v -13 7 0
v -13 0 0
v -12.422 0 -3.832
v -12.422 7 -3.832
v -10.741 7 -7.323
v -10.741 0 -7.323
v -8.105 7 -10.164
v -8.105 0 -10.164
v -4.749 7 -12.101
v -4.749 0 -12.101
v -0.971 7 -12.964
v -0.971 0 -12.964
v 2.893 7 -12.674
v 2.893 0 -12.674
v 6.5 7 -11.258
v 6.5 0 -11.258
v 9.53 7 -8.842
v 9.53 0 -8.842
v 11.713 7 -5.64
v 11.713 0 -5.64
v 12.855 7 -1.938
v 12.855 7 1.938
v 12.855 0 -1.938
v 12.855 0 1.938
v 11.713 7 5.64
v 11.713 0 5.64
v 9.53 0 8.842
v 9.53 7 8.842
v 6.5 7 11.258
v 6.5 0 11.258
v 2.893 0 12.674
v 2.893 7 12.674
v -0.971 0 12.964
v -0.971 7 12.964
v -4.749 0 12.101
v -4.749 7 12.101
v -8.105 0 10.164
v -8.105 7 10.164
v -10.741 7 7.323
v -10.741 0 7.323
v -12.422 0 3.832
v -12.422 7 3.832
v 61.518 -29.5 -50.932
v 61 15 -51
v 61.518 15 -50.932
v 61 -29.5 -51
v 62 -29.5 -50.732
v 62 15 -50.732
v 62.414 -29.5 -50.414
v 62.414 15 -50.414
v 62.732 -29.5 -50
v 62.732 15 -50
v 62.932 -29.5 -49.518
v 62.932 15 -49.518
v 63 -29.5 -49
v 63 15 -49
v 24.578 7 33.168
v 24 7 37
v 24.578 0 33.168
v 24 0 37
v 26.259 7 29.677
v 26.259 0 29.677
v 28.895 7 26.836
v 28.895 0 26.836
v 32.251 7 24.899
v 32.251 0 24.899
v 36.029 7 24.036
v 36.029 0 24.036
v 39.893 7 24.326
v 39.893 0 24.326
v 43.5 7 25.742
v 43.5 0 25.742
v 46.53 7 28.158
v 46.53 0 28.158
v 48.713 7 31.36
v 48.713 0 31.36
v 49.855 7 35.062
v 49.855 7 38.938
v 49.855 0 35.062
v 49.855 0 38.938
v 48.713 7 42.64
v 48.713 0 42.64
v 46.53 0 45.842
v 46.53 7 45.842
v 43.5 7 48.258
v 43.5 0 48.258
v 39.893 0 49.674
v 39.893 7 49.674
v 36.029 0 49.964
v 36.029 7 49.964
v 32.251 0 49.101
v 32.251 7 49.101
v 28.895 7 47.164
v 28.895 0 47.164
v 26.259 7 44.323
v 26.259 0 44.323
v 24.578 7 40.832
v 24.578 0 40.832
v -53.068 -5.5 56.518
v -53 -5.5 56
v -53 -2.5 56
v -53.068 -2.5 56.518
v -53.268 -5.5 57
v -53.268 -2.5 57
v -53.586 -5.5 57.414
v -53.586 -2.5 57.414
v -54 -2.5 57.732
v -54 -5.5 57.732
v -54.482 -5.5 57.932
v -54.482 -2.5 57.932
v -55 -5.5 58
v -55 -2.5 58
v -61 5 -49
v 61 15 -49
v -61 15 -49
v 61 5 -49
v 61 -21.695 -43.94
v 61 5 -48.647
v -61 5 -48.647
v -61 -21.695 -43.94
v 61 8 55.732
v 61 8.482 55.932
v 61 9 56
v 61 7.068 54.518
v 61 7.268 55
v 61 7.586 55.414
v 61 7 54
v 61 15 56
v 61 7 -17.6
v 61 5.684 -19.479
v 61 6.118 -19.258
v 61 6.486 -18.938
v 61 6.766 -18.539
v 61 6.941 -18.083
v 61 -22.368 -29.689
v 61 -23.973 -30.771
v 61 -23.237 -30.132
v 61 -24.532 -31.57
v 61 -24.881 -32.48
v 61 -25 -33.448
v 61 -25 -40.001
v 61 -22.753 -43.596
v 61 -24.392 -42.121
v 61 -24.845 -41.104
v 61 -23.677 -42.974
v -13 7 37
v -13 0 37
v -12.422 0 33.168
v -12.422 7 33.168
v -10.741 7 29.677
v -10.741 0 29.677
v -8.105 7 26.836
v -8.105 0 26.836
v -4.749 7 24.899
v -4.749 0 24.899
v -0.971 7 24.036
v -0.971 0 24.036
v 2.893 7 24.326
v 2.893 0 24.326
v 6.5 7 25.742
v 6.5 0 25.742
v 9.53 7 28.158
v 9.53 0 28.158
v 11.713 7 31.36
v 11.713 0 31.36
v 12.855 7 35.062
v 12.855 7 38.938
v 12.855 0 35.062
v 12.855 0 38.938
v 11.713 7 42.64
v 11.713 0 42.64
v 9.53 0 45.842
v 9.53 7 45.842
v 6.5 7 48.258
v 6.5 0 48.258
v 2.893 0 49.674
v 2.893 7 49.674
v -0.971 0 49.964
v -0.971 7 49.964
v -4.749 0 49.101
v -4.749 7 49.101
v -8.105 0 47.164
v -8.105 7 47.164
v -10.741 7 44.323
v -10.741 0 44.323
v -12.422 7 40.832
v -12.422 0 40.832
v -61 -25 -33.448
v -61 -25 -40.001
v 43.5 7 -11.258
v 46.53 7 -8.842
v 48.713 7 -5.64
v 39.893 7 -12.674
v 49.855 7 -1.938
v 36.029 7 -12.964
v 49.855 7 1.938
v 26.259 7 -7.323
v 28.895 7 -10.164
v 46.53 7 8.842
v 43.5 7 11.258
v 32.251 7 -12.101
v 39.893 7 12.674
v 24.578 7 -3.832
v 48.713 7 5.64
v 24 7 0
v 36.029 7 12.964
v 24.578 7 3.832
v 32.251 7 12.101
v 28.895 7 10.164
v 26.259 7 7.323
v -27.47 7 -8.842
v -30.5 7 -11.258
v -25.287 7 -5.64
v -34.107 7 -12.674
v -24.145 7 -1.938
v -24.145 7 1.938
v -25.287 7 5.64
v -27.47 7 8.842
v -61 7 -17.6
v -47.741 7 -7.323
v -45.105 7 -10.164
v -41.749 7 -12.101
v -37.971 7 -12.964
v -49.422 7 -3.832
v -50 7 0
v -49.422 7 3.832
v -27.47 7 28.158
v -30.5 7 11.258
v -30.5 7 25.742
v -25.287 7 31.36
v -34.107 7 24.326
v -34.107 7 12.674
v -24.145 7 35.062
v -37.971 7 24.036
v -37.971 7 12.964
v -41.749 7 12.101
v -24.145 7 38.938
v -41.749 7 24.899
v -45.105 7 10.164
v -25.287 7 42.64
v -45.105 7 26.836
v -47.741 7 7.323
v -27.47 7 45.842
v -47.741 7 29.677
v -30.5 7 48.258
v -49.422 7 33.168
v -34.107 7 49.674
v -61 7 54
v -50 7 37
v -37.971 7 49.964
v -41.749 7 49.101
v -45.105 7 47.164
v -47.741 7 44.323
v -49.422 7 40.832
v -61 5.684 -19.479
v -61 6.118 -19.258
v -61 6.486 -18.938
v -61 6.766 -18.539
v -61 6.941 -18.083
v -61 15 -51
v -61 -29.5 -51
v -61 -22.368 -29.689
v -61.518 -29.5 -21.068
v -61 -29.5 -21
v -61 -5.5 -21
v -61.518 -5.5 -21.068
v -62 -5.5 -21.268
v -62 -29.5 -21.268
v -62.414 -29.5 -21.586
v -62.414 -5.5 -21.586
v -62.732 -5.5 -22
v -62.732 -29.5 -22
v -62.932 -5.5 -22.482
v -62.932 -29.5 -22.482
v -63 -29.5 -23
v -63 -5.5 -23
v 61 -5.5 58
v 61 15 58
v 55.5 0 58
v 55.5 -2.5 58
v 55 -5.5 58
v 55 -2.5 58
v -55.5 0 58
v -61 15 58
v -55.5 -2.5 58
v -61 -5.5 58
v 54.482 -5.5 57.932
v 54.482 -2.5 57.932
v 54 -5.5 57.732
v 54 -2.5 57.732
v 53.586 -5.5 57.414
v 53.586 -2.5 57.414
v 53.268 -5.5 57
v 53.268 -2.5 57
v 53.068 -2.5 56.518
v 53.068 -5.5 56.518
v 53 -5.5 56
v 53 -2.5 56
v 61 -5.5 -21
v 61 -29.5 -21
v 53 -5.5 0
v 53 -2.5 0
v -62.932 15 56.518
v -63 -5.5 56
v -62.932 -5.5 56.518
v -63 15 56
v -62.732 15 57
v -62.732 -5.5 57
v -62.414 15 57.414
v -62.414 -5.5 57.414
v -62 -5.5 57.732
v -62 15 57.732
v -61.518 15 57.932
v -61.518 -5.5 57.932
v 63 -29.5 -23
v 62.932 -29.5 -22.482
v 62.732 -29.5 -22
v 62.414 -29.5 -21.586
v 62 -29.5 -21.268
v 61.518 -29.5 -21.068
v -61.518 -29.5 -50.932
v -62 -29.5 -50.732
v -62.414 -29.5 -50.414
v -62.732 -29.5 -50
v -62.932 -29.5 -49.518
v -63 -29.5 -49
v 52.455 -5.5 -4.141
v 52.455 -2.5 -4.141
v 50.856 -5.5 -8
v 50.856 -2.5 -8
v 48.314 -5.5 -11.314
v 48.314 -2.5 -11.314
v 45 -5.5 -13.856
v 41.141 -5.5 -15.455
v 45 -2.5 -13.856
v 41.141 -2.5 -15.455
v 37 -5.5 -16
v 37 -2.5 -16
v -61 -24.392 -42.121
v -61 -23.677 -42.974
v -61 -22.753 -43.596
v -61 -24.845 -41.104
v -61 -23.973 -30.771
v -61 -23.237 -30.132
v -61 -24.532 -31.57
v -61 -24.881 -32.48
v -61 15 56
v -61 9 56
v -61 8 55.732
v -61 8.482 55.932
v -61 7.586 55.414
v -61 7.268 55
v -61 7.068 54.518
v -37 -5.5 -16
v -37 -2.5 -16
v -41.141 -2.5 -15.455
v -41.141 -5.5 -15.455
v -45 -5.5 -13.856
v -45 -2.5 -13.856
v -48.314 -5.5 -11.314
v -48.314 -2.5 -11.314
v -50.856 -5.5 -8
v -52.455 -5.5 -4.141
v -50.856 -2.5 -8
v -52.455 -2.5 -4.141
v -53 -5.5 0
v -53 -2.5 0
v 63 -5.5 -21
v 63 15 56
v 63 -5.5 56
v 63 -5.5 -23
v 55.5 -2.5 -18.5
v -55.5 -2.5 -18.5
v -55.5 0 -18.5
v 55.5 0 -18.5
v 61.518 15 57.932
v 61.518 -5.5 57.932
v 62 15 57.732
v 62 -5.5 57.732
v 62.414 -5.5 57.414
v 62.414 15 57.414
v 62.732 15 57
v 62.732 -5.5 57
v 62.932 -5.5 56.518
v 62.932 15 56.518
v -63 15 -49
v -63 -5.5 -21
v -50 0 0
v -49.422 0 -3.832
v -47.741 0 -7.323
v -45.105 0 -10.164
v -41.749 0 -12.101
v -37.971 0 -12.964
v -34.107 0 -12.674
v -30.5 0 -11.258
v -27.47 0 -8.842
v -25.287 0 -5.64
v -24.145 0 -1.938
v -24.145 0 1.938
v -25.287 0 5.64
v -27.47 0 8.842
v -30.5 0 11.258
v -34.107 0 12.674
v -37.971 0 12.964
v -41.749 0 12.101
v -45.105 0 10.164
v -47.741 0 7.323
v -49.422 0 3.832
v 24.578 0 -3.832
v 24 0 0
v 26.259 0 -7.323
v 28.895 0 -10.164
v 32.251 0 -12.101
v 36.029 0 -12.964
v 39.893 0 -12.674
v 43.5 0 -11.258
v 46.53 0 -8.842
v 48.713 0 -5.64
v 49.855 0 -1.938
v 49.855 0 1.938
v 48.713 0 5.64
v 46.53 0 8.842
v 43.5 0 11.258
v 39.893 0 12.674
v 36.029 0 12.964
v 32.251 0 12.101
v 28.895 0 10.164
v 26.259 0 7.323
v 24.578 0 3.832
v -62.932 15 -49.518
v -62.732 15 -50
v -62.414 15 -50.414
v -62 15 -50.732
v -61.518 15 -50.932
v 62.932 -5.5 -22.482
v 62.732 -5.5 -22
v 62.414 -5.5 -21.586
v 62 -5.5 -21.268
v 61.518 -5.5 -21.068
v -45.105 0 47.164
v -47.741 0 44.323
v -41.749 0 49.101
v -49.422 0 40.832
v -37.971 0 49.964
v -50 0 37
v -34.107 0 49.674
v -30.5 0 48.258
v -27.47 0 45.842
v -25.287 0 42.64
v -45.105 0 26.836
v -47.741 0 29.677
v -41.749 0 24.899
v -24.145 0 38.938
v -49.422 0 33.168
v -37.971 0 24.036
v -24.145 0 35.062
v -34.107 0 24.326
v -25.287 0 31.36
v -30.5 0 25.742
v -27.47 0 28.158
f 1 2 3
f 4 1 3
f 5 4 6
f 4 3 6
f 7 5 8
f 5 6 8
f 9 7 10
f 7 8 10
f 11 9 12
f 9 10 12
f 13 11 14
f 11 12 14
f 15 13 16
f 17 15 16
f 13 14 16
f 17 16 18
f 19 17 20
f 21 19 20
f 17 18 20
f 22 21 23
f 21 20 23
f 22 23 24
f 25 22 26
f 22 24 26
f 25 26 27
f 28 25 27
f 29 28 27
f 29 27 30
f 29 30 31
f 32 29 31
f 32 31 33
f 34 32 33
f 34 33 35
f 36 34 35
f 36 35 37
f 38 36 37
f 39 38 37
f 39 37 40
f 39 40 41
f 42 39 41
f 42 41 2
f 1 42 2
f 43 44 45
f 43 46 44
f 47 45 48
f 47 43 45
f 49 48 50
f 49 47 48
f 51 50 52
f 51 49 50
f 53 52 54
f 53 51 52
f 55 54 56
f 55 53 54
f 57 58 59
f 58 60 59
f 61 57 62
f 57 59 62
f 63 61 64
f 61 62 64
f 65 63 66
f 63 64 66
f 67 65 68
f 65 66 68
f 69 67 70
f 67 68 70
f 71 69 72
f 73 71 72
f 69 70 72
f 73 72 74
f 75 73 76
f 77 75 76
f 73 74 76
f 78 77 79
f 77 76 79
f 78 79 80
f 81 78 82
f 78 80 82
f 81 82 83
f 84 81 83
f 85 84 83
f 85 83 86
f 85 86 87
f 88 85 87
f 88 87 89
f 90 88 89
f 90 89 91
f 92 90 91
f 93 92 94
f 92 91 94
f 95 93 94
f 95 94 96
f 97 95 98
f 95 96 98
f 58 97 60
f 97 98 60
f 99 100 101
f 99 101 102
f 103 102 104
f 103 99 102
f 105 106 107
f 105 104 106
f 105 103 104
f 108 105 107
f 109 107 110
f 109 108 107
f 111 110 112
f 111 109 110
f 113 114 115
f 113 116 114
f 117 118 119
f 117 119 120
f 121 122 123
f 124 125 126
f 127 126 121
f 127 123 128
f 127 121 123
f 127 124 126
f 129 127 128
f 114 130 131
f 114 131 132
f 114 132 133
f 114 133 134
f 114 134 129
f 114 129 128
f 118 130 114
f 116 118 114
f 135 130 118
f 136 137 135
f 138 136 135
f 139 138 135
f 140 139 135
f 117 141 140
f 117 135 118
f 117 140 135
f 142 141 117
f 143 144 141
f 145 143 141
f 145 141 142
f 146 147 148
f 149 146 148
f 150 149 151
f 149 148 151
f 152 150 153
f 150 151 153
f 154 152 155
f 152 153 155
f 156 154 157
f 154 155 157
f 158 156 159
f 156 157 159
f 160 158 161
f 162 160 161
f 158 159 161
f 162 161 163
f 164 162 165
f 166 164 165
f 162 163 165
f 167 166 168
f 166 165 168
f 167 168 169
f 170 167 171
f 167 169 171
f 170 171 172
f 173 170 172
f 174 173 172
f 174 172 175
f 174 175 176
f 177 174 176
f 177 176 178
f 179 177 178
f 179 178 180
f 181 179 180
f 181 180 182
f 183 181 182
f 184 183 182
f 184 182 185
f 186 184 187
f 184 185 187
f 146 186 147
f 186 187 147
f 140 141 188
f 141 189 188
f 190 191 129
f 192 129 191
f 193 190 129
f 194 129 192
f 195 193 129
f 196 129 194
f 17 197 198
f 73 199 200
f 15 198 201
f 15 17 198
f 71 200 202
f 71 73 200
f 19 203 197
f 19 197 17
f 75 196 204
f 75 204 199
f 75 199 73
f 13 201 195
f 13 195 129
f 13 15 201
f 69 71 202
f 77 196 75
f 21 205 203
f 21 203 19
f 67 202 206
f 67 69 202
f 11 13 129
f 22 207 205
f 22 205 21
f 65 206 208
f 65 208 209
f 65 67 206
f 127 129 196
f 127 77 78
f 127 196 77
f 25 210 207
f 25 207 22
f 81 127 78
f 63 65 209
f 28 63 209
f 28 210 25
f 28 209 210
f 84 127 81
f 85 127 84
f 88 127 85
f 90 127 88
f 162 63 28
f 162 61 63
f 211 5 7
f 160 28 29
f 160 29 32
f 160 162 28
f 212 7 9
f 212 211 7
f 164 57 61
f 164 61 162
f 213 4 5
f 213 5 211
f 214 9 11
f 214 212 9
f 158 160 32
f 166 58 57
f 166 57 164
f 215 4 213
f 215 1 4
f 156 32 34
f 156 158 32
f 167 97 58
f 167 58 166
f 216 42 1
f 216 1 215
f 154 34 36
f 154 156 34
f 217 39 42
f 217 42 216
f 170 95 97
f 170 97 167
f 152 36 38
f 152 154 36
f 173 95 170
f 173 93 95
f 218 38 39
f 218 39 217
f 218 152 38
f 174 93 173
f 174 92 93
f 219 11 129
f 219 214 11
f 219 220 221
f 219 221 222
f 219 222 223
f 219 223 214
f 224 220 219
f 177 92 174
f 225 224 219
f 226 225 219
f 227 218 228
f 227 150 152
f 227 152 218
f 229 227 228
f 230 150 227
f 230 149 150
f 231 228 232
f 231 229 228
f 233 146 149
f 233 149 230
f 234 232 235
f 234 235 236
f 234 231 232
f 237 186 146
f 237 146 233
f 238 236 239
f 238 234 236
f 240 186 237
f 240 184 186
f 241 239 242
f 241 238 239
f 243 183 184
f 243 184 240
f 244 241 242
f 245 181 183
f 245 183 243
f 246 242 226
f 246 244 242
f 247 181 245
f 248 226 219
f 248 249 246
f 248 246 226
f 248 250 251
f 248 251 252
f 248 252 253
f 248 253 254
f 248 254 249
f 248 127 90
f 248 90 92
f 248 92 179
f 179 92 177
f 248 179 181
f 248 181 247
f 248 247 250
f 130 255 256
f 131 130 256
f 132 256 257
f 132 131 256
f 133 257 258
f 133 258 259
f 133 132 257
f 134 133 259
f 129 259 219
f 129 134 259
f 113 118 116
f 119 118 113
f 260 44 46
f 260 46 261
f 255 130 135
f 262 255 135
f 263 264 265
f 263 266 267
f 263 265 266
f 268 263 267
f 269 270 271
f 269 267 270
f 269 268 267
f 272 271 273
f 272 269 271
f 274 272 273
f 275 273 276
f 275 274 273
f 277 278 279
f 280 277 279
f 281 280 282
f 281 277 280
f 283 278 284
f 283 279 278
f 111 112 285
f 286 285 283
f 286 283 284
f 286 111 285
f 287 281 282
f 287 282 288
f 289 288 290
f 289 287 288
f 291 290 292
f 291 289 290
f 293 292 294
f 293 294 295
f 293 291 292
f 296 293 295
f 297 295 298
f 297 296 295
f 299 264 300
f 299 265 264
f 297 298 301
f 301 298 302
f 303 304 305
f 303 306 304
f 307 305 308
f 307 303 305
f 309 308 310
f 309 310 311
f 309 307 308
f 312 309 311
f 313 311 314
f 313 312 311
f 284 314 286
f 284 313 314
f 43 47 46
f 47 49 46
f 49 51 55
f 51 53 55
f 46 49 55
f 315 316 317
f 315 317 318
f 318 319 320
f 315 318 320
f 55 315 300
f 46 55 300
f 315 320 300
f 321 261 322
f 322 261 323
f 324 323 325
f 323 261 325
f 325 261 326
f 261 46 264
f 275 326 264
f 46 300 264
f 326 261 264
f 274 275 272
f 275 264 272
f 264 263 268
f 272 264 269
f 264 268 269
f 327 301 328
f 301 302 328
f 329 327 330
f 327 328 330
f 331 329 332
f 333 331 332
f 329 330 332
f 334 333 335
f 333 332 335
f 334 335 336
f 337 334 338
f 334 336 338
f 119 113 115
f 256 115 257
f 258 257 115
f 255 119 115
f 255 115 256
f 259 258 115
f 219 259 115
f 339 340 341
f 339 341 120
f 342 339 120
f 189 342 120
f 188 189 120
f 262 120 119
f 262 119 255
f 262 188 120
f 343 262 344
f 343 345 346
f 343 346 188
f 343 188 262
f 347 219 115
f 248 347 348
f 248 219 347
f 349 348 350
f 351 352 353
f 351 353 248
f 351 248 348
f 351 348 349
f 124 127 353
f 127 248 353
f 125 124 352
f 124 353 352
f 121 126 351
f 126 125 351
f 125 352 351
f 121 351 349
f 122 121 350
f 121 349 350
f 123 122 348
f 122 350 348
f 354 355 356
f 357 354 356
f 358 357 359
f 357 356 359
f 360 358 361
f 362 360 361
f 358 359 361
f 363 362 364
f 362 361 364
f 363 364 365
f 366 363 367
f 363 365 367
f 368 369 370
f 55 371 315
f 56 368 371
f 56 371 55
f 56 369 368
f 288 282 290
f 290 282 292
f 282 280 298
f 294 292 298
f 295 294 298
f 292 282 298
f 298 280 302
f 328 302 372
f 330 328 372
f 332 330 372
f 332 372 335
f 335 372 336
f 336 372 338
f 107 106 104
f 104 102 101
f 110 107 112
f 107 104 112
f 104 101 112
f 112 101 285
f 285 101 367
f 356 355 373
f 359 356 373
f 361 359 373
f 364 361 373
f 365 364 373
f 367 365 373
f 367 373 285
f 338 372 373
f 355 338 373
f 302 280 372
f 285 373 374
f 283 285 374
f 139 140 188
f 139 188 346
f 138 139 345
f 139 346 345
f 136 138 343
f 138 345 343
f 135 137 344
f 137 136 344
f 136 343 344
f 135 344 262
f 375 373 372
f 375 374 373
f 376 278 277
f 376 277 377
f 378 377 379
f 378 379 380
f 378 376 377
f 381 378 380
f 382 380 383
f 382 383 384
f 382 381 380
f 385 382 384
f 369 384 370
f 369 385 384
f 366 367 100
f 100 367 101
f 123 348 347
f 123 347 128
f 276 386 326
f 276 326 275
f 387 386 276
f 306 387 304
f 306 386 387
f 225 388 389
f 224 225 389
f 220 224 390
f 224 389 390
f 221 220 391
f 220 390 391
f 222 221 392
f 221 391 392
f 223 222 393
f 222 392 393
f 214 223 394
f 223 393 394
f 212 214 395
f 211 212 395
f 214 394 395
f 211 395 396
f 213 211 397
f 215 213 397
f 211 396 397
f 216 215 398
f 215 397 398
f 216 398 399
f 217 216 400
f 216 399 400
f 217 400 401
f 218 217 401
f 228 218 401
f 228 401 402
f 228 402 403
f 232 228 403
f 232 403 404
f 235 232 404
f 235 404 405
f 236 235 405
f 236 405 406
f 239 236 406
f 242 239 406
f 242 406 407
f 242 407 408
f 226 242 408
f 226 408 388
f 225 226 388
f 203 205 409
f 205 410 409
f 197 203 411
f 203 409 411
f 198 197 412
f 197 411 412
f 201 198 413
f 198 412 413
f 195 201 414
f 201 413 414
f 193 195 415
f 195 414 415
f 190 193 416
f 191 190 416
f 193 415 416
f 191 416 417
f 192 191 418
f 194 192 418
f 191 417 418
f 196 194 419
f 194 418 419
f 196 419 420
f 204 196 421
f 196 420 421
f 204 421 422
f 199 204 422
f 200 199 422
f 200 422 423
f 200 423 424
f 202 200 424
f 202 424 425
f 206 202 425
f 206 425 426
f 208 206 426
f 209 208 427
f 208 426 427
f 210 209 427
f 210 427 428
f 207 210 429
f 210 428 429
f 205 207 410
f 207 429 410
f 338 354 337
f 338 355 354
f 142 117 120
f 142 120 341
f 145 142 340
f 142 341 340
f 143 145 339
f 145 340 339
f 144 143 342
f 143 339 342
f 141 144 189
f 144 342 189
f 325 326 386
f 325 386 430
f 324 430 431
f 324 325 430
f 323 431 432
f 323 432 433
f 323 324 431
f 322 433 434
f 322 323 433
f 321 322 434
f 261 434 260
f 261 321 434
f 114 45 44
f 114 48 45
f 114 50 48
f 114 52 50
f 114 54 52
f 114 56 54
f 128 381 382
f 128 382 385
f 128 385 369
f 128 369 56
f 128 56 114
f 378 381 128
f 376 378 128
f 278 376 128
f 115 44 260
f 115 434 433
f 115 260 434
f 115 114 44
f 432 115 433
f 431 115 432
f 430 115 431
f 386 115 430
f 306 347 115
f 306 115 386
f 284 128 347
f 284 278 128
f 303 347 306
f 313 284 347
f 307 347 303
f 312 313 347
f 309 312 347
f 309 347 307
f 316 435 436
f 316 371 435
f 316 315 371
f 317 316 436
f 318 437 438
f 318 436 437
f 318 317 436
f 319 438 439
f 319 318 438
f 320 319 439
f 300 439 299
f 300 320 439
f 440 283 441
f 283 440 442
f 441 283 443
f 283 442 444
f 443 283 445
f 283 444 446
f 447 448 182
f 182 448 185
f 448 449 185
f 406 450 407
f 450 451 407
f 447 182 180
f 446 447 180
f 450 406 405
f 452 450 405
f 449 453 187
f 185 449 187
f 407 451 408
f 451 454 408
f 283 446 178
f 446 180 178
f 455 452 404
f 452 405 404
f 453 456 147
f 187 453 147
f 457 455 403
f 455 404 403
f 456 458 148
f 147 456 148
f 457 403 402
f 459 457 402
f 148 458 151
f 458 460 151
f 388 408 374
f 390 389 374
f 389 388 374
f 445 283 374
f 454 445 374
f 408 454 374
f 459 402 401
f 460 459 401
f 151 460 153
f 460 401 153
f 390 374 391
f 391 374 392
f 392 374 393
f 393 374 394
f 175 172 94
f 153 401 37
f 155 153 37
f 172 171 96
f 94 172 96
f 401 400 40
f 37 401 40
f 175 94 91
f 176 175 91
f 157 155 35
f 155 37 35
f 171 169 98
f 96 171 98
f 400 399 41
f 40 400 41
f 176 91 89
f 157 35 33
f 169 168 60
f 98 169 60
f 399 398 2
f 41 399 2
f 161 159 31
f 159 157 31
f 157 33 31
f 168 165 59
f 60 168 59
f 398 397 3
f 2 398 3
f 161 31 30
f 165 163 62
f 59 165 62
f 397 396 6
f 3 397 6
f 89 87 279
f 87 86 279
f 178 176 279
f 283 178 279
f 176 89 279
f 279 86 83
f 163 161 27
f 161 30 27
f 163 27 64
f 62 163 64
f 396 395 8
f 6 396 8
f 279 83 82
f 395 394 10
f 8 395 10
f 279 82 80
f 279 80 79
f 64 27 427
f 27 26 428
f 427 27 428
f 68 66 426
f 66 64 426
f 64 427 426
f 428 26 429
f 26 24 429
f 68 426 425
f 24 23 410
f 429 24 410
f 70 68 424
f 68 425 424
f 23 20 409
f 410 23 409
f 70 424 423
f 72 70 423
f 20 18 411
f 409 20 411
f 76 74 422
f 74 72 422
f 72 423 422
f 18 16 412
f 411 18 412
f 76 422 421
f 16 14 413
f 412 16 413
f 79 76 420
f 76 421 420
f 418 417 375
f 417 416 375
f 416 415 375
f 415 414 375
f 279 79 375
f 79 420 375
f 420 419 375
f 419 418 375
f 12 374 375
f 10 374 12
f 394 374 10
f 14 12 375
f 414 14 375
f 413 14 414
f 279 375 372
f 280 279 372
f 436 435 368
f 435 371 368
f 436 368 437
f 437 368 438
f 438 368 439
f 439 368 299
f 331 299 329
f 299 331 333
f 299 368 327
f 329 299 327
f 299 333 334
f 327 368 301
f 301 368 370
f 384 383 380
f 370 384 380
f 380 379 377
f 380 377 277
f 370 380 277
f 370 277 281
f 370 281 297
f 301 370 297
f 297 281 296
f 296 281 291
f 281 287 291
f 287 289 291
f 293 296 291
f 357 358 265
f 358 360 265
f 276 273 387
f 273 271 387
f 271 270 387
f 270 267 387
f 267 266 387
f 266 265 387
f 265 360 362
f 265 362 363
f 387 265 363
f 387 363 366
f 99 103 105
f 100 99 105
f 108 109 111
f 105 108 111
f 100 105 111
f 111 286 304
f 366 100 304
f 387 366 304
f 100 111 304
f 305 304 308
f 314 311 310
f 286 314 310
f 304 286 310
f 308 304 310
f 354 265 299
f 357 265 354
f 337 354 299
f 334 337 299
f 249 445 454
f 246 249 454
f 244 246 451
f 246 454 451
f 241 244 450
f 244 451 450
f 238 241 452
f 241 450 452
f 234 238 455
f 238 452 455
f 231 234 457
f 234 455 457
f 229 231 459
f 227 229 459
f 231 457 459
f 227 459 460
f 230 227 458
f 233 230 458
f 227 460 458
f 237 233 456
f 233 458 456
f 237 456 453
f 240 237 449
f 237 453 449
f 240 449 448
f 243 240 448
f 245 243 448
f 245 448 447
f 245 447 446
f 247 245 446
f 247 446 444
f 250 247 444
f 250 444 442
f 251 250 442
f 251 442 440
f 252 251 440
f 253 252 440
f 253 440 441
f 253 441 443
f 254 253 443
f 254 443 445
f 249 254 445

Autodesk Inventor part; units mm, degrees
ref_plane "YZ Plane" through (0, 0, 0) normal (1, 0, 0) x (0, 1, 0)
ref_plane "XY Plane" through (0, 0, 0) normal (0, 0, 1) x (1, 0, 0)
sketch "Sketch1" plane through (0, 0, 0) normal (0, 1, 0) x (-1, 0, 0)
  line L0 (25.9, 0) -> (-25.9, 0) projected
  line L1 (0, -25.9) -> (0, 25.9) projected
  circle A0 centre (0, 0) radius 18.5 construction
  circle A1 centre (0, 0) radius 13 construction
  dimension "d0" = 37
  dimension "d1" = 26
sketch "Sketch2" plane through (0, 0, 0) normal (0, 1, 0) x (-1, 0, 0)
  line L0 (88.2, 0) -> (-88.2, 0) projected
  line L1 (0, -36.8) -> (0, 73.8) projected
  line L2 (-63, 58) -> (-63, -21)
  line L3 (-63, -21) -> (63, -21)
  line L4 (63, -21) -> (63, 58)
  line L5 (-63, 58) -> (63, 58)
  point P0 (0, 0)
  dimension "d3" = 126
  dimension "d29" = 21
  dimension "d30" = 58
extrude "Extrusion1" add sketch "Sketch2" along normal blind 7
sketch "Sketch6" plane through (0, 0, 0) normal (0, 1, 0) x (-1, 0, 0)
  line L0 (63, -21) -> (-63, -21) projected
  line L1 (63, 58) -> (63, -21) projected
  line L2 (-63, -21) -> (63, -21)
  line L3 (63, -21) -> (63, 58)
  line L4 (-63, 58) -> (-63, -21)
  line L5 (88.2, 0) -> (-88.2, 0) projected
  line L6 (0, -36.3) -> (0, 70.8) projected
  line L7 (63, 58) -> (-63, 58) projected
  line L8 (-53, 58) -> (-53, 0)
  line L9 (53, 0) -> (53, 58)
  line L10 (53, 58) -> (63, 58)
  line L11 (-63, 58) -> (-63, -21) projected
  line L12 (-63, 58) -> (-53, 58)
  arc A0 (37, -16) -> (53, 0) centre (37, 0) ccw
  arc A1 (-53, 0) -> (-37, -16) centre (-37, 0) ccw
  line L13 (37, -16) -> (-39.8141, -16)
  point P0 (0, 0)
  point P1 (-16, 0)
  dimension "d101" = 53
  dimension "d102" = 53
  dimension "d103" = 32
  dimension "d104" = 32
extrude "Extrusion5" add sketch "Sketch6" against normal blind 5.5 contours L0 L6 L13 A0 L5 L1 | L0 L4 L5 A1 L13 L6 | L5 L9 L7 L1 | L4 L7 L8 L5
sketch "Sketch4" plane through (0, 0, 0) normal (0, 0, 1) x (1, 0, 0)
  line L0 (-55.5, 0) -> (55.5, 0)
  line L1 (55.5, 0) -> (55.5, -2.5)
  line L2 (55.5, -2.5) -> (-55.5, -2.5)
  line L3 (-55.5, -2.5) -> (-55.5, 0)
  line L4 (-77.7, 0) -> (77.7, 0) projected
  line L5 (0, -3) -> (0, 0.5) projected
  point P0 (0, 0)
  dimension "d10" = 111
  dimension "d11" = 2.5
extrude "Extrusion6" cut sketch "Sketch4" against normal blind 21
sketch "Sketch5" plane through (0, 0, 0) normal (0, 1, 0) x (-1, 0, 0)
  circle A0 centre (0, 0) radius 18.5 construction
  circle A1 centre (0, 0) radius 18.5 construction
  line L0 (77.7, 0) -> (-77.7, 0) projected
  line L1 (0, -28.9) -> (0, 26.4) projected
  line L2 (-55.5, -21) -> (55.5, -21)
  line L3 (55.5, -21) -> (55.5, -18.5)
  line L4 (55.5, -18.5) -> (-55.5, -18.5)
  line L5 (-55.5, -18.5) -> (-55.5, -21)
  dimension "d25" = 111
  dimension "d26" = 21
extrude "Extrusion7" add sketch "Sketch5" against normal blind 2.5
sketch "Sketch7" plane through (0, 0, 0) normal (0, 0, 1) x (1, 0, 0)
  line L0 (-55.5, 0) -> (55.5, 0)
  line L1 (55.5, 0) -> (55.5, -2.5)
  line L2 (55.5, -2.5) -> (-55.5, -2.5)
  line L3 (-55.5, -2.5) -> (-55.5, 0)
  line L4 (53, 0) -> (-53, 0) projected
  line L5 (-77.7, 0) -> (77.7, 0) projected
  line L6 (0, -3) -> (0, 0.5) projected
  point P0 (-16, 0)
  point P1 (16, 0)
  dimension "d53" = 2.5
  dimension "d54" = 55.5
extrude "Extrusion8" cut sketch "Sketch7" along normal blind 58
sketch "Sketch8" plane through (0, 0, 0) normal (0, 1, 0) x (-1, 0, 0)
  circle A0 centre (0, 0) radius 13
  dimension "d34" = 26
extrude "Extrusion9" cut sketch "Sketch8" along normal through all
pattern_linear "Rectangular Pattern1" count 2 spacing 37 along (0, 0, 1) count 3 spacing 37 along (1, 0, 0) of "Extrusion9" second direction both ways yes
sketch "Sketch9" plane through (0, 7, 0) normal (0, 1, 0) x (1, 0, 0)
  circle A0 centre (0, 0) radius 13
  circle A1 centre (0, 0) radius 15
  dimension "d40" = 26
  dimension "d41" = 30
extrude "Extrusion10" [suppressed]
sketch "Sketch10" plane through (0, 5, 0) normal (0, 1, 0) x (1, 0, 0)
  arc A0 (16, 0) -> (-16, 0) centre (0, 0) ccw projected
  line L0 (1.5, -18) -> (-1.5, -18)
  line L1 (-29.4, 0) -> (29.4, 0) projected
  line L2 (0, 36.3) -> (0, -70.8) projected
  line L3 (1.5, -12) -> (-1.5, -12)
  line L4 (1.5, -12) -> (1.5, -18)
  line L5 (-1.5, -18) -> (-1.5, -12)
  dimension "d48" = 3
  dimension "d49" = 12
  dimension "d50" = 6
extrude "Extrusion11" [suppressed]
ref_plane "Work Plane1" through (0, 5, 0) normal (0, 1, 0) x (-1, 0, 0)
sketch "Sketch12" plane through (0, 5, 0) normal (0, 1, 0) x (-1, 0, 0)
  line L0 (63, 58) -> (63, -21) projected
  line L1 (63, -21) -> (-63, -21)
  line L2 (-63, -21) -> (-63, -51)
  line L3 (-63, -51) -> (63, -51)
  line L4 (63, -51) -> (63, -21)
  point P0 (0, 0)
  dimension "d61" = 126
  dimension "d62" = 30
extrude "Extrusion12" add sketch "Sketch12" against normal blind 34.5
sketch "Sketch13" plane through (0, 0, 0) normal (1, 0, 0) x (0, 1, 0)
  line L0 (-31.4, 0) -> (13.4, 0) projected
  line L1 (0, -62.5) -> (0, 32) projected
  line L2 (7, -19) -> (7, -49)
  line L3 (7, -49) -> (-25, -43.3575)
  line L4 (-25, -43.3575) -> (-25, -30.647)
  line L5 (7, -19) -> (-25, -30.647)
  point P0 (0, 0)
  dimension "d85" = 25
  dimension "d86" = 7
  dimension "d87" = 49
  dimension "d88" = 30
  dimension "d89" = 100
  dimension "d90" = 110
extrude "Extrusion14" cut sketch "Sketch13" along normal mid plane 122
sketch "Sketch14" plane through (0, 5, 0) normal (0, 1, 0) x (-1, 0, 0)
  line L0 (0, -72.3) -> (0, 76.8) projected
  line L1 (61, 56) -> (-61, 56)
  line L2 (-61, 56) -> (-61, -49)
  line L3 (-61, -49) -> (61, -49)
  line L4 (61, -49) -> (61, 56)
  line L5 (63, 58) -> (-63, 58)
  line L6 (-63, 58) -> (-63, -51)
  line L7 (-63, -51) -> (63, -51)
  line L8 (63, -51) -> (63, 58)
  line L9 (88.2, 0) -> (-88.2, 0) projected
  dimension "d91" = 51
  dimension "d92" = 58
  dimension "d93" = 126
  dimension "d94" = 122
  dimension "d95" = 56
  dimension "d96" = 49
extrude "Extrusion15" add sketch "Sketch14" along normal blind 10 contours L7 L6 L9 L2 L3 L0 | L0 L3 L4 L9 L8 L7 | L6 L5 L0 L1 L2 L9 | L9 L4 L1 L0 L5 L8
fillet "Fillet3" radius 2 4 edges at (63, 4.75, 58) (63, -7.25, -51) (-63, -7.25, -51) (-63, 4.75, 58)
fillet "Fillet5" radius 2 2 edges at (63, -17.5, -21) (-63, -17.5, -21)
fillet "Fillet6" radius 2 2 edges at (0, 7, 56) (0, 7, -19)
fillet "Fillet7" radius 4 2 edges at (0, -25, -30.647) (0, -25, -43.3575)
fillet "Fillet8" radius 2 2 edges at (-53, -4, 58) (53, -4, 58)
equation "\"d102\" = d101"
properties part number "NespressoSpeedfiller-6X"
